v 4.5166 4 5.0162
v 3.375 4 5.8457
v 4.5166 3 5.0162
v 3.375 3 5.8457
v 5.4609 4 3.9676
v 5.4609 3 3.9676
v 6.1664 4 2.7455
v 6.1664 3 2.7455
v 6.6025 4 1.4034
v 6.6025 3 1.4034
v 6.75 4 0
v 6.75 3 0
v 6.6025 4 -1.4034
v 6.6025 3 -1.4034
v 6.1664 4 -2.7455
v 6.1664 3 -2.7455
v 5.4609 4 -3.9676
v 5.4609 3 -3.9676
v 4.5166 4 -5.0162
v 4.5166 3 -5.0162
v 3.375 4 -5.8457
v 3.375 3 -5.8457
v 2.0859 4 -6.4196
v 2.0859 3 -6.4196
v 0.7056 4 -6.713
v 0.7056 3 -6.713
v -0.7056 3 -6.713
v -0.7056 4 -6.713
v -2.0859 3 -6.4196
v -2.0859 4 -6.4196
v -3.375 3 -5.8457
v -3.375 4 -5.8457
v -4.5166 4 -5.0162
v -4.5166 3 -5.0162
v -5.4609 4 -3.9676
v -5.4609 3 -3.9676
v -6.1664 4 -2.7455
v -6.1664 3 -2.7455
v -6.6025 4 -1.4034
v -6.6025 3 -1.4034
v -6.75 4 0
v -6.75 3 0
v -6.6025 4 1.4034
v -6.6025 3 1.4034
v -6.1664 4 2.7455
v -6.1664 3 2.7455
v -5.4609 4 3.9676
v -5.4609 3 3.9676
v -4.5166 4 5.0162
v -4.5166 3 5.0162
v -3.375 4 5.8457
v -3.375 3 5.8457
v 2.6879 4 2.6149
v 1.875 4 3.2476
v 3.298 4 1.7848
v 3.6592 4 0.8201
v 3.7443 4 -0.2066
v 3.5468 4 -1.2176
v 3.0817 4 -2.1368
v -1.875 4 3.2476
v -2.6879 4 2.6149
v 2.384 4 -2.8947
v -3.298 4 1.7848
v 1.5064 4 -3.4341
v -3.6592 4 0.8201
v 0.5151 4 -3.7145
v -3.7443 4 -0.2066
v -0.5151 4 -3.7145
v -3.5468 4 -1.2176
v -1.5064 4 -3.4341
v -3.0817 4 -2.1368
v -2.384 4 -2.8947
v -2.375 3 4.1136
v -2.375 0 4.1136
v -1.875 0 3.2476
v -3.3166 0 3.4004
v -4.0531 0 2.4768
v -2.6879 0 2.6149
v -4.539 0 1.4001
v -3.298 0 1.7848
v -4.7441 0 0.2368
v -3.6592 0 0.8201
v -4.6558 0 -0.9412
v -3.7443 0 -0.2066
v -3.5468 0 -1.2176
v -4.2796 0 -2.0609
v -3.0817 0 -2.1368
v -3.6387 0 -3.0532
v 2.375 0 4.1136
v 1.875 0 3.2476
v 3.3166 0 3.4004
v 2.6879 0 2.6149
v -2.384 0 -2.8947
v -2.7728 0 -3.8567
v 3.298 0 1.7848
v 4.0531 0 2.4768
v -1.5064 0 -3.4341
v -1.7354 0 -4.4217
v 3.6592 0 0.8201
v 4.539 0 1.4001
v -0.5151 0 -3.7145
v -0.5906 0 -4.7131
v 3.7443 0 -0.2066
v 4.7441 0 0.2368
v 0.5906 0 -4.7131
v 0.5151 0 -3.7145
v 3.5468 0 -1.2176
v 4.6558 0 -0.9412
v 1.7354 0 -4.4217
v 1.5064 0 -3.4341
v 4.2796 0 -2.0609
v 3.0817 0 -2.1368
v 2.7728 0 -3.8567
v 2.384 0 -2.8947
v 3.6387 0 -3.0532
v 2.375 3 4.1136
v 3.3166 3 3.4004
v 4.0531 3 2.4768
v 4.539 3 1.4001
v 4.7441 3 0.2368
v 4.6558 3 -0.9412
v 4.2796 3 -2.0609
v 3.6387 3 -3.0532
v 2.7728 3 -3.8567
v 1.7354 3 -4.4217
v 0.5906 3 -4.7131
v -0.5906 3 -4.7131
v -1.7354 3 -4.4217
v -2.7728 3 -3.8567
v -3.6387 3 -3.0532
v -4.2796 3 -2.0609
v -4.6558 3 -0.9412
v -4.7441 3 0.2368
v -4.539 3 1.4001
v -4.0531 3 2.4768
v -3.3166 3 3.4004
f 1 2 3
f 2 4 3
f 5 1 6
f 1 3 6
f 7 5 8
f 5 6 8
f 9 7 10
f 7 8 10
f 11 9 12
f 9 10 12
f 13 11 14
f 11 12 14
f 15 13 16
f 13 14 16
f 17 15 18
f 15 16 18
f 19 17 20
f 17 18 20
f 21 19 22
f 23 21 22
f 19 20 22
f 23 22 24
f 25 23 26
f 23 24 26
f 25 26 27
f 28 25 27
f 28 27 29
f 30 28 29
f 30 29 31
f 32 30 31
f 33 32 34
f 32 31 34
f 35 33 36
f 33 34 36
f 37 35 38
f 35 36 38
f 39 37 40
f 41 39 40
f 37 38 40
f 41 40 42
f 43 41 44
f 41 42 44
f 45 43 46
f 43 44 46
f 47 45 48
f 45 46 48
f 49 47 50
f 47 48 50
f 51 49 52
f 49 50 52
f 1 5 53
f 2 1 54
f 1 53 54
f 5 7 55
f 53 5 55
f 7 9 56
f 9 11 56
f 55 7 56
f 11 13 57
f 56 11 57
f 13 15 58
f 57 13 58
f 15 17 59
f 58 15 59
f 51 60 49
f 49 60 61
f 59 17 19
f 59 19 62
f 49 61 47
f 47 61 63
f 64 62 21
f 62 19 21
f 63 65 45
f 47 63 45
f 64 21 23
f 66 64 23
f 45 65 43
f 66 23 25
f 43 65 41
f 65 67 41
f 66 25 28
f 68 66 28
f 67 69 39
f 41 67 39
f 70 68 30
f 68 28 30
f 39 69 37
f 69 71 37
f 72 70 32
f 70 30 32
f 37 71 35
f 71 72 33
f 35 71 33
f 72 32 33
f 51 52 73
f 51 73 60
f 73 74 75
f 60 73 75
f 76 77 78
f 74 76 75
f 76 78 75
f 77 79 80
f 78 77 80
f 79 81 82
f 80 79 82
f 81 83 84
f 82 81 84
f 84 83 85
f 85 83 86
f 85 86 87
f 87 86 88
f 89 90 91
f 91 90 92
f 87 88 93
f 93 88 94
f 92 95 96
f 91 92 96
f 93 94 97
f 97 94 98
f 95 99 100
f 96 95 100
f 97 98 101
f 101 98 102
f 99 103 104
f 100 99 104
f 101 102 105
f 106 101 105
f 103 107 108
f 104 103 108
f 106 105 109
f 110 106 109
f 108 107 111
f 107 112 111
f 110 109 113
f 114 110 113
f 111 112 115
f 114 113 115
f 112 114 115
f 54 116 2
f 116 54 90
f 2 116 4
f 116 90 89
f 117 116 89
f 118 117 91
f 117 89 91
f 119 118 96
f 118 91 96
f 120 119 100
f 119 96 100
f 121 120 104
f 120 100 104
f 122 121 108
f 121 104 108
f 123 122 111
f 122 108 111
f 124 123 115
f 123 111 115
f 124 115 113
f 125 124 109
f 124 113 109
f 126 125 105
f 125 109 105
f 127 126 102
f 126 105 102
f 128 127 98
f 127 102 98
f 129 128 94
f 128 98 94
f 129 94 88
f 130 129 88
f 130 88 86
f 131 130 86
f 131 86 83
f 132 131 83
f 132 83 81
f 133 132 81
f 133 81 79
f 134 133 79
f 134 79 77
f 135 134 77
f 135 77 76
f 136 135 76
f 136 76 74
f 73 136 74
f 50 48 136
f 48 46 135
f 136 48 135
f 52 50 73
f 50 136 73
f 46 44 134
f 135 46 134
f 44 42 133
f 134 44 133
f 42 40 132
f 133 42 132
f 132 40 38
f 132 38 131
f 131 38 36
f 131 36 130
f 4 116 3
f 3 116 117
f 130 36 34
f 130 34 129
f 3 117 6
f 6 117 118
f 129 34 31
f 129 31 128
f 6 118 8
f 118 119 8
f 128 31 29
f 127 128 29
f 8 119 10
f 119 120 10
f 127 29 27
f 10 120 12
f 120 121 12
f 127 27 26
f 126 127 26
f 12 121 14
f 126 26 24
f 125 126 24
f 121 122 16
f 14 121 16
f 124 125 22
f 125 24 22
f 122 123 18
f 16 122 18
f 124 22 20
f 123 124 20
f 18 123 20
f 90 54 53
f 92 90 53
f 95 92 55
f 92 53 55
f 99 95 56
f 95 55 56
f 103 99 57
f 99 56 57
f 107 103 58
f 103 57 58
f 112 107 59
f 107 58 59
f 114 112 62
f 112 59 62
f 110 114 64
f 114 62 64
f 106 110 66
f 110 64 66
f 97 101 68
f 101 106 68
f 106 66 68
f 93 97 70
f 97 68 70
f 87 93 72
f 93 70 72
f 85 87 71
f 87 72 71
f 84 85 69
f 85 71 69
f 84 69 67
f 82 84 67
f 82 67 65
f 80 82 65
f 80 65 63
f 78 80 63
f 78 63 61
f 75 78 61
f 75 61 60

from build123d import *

# Parameters (mm, degrees)
CUT_EXTRUDE1_DEPTH = 10
SCALE1_SCALE       = 0.5


with BuildPart() as part:
    # Sketch1 → Revolve1 (revolve)
    with BuildSketch(Plane.XY):
        Polygon((7.5, 0), (7.5, 8), (13.5, 8), (13.5, 6), (9.5, 6), (9.5, 0), align=None)
    revolve(axis=Axis((0, 0, 0), (0, 1, 0)))

    # Sketch2 → Cut-Extrude1 (cut)
    with BuildSketch(Plane(origin=(0, 0, 0), x_dir=(1, 0, 0), z_dir=(0, 1, 0))):
        Polygon((-9.091166867, -15.746362913), (0, 0), (8.625529774, -14.939855811), align=None)
    extrude(amount=CUT_EXTRUDE1_DEPTH, mode=Mode.SUBTRACT)


with BuildPart() as part_1:
    # Scale1: scaled about (0, 0, 0)
    add(part.part.scale(SCALE1_SCALE))


solid = part_1.part
